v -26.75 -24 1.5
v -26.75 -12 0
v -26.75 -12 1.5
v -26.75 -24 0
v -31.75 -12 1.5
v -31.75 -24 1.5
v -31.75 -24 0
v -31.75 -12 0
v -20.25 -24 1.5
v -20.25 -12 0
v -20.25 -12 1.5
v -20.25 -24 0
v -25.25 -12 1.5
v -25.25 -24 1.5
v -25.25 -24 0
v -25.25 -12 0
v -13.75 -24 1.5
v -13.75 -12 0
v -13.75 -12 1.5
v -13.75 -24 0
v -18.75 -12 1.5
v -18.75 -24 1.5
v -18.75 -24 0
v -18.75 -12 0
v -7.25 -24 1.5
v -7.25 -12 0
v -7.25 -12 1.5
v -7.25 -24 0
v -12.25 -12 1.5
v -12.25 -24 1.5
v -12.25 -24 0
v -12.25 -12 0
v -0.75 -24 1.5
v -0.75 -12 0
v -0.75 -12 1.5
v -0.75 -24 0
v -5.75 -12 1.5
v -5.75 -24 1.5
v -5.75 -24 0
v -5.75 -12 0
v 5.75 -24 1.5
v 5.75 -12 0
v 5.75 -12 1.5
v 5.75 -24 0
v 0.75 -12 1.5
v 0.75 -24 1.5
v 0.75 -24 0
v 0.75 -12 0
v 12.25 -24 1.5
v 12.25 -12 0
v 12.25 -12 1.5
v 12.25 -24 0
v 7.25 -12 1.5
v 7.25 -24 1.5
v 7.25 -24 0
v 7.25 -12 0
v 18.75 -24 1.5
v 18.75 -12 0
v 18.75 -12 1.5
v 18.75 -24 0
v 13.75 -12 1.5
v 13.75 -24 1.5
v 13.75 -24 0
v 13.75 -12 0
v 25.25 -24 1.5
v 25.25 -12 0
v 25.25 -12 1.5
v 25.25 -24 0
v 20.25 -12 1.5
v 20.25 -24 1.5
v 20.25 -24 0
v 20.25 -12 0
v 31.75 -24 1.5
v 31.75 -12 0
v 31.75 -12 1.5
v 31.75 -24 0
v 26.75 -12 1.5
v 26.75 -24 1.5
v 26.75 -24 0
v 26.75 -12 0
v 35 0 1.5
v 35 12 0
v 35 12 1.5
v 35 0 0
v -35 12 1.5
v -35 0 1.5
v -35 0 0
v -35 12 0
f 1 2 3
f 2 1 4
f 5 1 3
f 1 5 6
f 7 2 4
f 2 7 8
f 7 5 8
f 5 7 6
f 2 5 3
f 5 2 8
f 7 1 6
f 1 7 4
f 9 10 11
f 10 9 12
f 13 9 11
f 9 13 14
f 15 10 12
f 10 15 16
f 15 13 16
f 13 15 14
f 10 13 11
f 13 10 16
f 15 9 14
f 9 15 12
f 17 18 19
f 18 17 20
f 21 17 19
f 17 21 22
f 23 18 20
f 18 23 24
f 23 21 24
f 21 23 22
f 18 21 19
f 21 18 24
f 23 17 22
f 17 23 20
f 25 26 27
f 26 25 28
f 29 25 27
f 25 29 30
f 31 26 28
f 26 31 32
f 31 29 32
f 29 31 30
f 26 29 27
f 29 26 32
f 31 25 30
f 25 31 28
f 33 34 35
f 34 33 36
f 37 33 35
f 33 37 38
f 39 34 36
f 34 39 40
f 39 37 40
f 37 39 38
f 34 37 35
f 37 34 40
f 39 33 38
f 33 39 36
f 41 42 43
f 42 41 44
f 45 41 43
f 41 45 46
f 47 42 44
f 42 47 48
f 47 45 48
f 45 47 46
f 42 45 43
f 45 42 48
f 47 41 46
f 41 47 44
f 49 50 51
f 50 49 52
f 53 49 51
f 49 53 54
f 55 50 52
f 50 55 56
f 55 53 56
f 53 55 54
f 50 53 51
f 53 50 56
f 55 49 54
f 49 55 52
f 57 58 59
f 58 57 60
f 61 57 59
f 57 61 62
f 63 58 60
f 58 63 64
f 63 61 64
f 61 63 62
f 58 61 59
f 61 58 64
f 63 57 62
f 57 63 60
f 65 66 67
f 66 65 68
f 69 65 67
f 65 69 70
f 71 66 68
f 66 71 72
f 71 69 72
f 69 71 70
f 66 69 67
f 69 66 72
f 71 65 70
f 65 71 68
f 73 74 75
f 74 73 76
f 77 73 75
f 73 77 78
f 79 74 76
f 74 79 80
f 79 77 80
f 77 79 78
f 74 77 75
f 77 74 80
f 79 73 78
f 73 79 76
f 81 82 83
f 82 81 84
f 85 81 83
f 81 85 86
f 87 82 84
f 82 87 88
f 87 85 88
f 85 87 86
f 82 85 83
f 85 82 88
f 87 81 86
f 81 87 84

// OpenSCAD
// 10-well agarose gel comb, printed lying flat
// Units: mm. Plate thickness (Z) = 1.5.

// ---- Spine (back bar) ----
spine_len   = 70;   // spine length along X
spine_wid   = 12;   // spine width along Y

// ---- Teeth ----
tooth_count = 10;   // number of wells
tooth_w     = 5.0;  // tooth width along X
tooth_l     = 12;   // tooth length along Y (overlaps spine by 12 mm)
gap         = 1.5;  // gap between neighbouring teeth along X

// ---- Misc ----
eps         = 0.5;  // cutter overshoot past faces
$fn         = 64;

// Derived
pitch    = tooth_w + gap;                 // centre-to-centre spacing
x_start  = -(tooth_count - 1) * pitch / 2; // first tooth centre (row centred)
tooth_h  = tooth_l + spine_wid;           // total tooth height from -Y edge

module spine() {
    translate([-spine_len / 2, 0, 0])
        cube([spine_len, spine_wid, 1.5]);
}

module teeth() {
    for (i = [0 : tooth_count - 1]) {
        translate([x_start + i * pitch - tooth_w / 2, -tooth_h, 0])
            cube([tooth_w, tooth_l, 1.5]);
    }
}

union() {
    spine();
    teeth();
}
